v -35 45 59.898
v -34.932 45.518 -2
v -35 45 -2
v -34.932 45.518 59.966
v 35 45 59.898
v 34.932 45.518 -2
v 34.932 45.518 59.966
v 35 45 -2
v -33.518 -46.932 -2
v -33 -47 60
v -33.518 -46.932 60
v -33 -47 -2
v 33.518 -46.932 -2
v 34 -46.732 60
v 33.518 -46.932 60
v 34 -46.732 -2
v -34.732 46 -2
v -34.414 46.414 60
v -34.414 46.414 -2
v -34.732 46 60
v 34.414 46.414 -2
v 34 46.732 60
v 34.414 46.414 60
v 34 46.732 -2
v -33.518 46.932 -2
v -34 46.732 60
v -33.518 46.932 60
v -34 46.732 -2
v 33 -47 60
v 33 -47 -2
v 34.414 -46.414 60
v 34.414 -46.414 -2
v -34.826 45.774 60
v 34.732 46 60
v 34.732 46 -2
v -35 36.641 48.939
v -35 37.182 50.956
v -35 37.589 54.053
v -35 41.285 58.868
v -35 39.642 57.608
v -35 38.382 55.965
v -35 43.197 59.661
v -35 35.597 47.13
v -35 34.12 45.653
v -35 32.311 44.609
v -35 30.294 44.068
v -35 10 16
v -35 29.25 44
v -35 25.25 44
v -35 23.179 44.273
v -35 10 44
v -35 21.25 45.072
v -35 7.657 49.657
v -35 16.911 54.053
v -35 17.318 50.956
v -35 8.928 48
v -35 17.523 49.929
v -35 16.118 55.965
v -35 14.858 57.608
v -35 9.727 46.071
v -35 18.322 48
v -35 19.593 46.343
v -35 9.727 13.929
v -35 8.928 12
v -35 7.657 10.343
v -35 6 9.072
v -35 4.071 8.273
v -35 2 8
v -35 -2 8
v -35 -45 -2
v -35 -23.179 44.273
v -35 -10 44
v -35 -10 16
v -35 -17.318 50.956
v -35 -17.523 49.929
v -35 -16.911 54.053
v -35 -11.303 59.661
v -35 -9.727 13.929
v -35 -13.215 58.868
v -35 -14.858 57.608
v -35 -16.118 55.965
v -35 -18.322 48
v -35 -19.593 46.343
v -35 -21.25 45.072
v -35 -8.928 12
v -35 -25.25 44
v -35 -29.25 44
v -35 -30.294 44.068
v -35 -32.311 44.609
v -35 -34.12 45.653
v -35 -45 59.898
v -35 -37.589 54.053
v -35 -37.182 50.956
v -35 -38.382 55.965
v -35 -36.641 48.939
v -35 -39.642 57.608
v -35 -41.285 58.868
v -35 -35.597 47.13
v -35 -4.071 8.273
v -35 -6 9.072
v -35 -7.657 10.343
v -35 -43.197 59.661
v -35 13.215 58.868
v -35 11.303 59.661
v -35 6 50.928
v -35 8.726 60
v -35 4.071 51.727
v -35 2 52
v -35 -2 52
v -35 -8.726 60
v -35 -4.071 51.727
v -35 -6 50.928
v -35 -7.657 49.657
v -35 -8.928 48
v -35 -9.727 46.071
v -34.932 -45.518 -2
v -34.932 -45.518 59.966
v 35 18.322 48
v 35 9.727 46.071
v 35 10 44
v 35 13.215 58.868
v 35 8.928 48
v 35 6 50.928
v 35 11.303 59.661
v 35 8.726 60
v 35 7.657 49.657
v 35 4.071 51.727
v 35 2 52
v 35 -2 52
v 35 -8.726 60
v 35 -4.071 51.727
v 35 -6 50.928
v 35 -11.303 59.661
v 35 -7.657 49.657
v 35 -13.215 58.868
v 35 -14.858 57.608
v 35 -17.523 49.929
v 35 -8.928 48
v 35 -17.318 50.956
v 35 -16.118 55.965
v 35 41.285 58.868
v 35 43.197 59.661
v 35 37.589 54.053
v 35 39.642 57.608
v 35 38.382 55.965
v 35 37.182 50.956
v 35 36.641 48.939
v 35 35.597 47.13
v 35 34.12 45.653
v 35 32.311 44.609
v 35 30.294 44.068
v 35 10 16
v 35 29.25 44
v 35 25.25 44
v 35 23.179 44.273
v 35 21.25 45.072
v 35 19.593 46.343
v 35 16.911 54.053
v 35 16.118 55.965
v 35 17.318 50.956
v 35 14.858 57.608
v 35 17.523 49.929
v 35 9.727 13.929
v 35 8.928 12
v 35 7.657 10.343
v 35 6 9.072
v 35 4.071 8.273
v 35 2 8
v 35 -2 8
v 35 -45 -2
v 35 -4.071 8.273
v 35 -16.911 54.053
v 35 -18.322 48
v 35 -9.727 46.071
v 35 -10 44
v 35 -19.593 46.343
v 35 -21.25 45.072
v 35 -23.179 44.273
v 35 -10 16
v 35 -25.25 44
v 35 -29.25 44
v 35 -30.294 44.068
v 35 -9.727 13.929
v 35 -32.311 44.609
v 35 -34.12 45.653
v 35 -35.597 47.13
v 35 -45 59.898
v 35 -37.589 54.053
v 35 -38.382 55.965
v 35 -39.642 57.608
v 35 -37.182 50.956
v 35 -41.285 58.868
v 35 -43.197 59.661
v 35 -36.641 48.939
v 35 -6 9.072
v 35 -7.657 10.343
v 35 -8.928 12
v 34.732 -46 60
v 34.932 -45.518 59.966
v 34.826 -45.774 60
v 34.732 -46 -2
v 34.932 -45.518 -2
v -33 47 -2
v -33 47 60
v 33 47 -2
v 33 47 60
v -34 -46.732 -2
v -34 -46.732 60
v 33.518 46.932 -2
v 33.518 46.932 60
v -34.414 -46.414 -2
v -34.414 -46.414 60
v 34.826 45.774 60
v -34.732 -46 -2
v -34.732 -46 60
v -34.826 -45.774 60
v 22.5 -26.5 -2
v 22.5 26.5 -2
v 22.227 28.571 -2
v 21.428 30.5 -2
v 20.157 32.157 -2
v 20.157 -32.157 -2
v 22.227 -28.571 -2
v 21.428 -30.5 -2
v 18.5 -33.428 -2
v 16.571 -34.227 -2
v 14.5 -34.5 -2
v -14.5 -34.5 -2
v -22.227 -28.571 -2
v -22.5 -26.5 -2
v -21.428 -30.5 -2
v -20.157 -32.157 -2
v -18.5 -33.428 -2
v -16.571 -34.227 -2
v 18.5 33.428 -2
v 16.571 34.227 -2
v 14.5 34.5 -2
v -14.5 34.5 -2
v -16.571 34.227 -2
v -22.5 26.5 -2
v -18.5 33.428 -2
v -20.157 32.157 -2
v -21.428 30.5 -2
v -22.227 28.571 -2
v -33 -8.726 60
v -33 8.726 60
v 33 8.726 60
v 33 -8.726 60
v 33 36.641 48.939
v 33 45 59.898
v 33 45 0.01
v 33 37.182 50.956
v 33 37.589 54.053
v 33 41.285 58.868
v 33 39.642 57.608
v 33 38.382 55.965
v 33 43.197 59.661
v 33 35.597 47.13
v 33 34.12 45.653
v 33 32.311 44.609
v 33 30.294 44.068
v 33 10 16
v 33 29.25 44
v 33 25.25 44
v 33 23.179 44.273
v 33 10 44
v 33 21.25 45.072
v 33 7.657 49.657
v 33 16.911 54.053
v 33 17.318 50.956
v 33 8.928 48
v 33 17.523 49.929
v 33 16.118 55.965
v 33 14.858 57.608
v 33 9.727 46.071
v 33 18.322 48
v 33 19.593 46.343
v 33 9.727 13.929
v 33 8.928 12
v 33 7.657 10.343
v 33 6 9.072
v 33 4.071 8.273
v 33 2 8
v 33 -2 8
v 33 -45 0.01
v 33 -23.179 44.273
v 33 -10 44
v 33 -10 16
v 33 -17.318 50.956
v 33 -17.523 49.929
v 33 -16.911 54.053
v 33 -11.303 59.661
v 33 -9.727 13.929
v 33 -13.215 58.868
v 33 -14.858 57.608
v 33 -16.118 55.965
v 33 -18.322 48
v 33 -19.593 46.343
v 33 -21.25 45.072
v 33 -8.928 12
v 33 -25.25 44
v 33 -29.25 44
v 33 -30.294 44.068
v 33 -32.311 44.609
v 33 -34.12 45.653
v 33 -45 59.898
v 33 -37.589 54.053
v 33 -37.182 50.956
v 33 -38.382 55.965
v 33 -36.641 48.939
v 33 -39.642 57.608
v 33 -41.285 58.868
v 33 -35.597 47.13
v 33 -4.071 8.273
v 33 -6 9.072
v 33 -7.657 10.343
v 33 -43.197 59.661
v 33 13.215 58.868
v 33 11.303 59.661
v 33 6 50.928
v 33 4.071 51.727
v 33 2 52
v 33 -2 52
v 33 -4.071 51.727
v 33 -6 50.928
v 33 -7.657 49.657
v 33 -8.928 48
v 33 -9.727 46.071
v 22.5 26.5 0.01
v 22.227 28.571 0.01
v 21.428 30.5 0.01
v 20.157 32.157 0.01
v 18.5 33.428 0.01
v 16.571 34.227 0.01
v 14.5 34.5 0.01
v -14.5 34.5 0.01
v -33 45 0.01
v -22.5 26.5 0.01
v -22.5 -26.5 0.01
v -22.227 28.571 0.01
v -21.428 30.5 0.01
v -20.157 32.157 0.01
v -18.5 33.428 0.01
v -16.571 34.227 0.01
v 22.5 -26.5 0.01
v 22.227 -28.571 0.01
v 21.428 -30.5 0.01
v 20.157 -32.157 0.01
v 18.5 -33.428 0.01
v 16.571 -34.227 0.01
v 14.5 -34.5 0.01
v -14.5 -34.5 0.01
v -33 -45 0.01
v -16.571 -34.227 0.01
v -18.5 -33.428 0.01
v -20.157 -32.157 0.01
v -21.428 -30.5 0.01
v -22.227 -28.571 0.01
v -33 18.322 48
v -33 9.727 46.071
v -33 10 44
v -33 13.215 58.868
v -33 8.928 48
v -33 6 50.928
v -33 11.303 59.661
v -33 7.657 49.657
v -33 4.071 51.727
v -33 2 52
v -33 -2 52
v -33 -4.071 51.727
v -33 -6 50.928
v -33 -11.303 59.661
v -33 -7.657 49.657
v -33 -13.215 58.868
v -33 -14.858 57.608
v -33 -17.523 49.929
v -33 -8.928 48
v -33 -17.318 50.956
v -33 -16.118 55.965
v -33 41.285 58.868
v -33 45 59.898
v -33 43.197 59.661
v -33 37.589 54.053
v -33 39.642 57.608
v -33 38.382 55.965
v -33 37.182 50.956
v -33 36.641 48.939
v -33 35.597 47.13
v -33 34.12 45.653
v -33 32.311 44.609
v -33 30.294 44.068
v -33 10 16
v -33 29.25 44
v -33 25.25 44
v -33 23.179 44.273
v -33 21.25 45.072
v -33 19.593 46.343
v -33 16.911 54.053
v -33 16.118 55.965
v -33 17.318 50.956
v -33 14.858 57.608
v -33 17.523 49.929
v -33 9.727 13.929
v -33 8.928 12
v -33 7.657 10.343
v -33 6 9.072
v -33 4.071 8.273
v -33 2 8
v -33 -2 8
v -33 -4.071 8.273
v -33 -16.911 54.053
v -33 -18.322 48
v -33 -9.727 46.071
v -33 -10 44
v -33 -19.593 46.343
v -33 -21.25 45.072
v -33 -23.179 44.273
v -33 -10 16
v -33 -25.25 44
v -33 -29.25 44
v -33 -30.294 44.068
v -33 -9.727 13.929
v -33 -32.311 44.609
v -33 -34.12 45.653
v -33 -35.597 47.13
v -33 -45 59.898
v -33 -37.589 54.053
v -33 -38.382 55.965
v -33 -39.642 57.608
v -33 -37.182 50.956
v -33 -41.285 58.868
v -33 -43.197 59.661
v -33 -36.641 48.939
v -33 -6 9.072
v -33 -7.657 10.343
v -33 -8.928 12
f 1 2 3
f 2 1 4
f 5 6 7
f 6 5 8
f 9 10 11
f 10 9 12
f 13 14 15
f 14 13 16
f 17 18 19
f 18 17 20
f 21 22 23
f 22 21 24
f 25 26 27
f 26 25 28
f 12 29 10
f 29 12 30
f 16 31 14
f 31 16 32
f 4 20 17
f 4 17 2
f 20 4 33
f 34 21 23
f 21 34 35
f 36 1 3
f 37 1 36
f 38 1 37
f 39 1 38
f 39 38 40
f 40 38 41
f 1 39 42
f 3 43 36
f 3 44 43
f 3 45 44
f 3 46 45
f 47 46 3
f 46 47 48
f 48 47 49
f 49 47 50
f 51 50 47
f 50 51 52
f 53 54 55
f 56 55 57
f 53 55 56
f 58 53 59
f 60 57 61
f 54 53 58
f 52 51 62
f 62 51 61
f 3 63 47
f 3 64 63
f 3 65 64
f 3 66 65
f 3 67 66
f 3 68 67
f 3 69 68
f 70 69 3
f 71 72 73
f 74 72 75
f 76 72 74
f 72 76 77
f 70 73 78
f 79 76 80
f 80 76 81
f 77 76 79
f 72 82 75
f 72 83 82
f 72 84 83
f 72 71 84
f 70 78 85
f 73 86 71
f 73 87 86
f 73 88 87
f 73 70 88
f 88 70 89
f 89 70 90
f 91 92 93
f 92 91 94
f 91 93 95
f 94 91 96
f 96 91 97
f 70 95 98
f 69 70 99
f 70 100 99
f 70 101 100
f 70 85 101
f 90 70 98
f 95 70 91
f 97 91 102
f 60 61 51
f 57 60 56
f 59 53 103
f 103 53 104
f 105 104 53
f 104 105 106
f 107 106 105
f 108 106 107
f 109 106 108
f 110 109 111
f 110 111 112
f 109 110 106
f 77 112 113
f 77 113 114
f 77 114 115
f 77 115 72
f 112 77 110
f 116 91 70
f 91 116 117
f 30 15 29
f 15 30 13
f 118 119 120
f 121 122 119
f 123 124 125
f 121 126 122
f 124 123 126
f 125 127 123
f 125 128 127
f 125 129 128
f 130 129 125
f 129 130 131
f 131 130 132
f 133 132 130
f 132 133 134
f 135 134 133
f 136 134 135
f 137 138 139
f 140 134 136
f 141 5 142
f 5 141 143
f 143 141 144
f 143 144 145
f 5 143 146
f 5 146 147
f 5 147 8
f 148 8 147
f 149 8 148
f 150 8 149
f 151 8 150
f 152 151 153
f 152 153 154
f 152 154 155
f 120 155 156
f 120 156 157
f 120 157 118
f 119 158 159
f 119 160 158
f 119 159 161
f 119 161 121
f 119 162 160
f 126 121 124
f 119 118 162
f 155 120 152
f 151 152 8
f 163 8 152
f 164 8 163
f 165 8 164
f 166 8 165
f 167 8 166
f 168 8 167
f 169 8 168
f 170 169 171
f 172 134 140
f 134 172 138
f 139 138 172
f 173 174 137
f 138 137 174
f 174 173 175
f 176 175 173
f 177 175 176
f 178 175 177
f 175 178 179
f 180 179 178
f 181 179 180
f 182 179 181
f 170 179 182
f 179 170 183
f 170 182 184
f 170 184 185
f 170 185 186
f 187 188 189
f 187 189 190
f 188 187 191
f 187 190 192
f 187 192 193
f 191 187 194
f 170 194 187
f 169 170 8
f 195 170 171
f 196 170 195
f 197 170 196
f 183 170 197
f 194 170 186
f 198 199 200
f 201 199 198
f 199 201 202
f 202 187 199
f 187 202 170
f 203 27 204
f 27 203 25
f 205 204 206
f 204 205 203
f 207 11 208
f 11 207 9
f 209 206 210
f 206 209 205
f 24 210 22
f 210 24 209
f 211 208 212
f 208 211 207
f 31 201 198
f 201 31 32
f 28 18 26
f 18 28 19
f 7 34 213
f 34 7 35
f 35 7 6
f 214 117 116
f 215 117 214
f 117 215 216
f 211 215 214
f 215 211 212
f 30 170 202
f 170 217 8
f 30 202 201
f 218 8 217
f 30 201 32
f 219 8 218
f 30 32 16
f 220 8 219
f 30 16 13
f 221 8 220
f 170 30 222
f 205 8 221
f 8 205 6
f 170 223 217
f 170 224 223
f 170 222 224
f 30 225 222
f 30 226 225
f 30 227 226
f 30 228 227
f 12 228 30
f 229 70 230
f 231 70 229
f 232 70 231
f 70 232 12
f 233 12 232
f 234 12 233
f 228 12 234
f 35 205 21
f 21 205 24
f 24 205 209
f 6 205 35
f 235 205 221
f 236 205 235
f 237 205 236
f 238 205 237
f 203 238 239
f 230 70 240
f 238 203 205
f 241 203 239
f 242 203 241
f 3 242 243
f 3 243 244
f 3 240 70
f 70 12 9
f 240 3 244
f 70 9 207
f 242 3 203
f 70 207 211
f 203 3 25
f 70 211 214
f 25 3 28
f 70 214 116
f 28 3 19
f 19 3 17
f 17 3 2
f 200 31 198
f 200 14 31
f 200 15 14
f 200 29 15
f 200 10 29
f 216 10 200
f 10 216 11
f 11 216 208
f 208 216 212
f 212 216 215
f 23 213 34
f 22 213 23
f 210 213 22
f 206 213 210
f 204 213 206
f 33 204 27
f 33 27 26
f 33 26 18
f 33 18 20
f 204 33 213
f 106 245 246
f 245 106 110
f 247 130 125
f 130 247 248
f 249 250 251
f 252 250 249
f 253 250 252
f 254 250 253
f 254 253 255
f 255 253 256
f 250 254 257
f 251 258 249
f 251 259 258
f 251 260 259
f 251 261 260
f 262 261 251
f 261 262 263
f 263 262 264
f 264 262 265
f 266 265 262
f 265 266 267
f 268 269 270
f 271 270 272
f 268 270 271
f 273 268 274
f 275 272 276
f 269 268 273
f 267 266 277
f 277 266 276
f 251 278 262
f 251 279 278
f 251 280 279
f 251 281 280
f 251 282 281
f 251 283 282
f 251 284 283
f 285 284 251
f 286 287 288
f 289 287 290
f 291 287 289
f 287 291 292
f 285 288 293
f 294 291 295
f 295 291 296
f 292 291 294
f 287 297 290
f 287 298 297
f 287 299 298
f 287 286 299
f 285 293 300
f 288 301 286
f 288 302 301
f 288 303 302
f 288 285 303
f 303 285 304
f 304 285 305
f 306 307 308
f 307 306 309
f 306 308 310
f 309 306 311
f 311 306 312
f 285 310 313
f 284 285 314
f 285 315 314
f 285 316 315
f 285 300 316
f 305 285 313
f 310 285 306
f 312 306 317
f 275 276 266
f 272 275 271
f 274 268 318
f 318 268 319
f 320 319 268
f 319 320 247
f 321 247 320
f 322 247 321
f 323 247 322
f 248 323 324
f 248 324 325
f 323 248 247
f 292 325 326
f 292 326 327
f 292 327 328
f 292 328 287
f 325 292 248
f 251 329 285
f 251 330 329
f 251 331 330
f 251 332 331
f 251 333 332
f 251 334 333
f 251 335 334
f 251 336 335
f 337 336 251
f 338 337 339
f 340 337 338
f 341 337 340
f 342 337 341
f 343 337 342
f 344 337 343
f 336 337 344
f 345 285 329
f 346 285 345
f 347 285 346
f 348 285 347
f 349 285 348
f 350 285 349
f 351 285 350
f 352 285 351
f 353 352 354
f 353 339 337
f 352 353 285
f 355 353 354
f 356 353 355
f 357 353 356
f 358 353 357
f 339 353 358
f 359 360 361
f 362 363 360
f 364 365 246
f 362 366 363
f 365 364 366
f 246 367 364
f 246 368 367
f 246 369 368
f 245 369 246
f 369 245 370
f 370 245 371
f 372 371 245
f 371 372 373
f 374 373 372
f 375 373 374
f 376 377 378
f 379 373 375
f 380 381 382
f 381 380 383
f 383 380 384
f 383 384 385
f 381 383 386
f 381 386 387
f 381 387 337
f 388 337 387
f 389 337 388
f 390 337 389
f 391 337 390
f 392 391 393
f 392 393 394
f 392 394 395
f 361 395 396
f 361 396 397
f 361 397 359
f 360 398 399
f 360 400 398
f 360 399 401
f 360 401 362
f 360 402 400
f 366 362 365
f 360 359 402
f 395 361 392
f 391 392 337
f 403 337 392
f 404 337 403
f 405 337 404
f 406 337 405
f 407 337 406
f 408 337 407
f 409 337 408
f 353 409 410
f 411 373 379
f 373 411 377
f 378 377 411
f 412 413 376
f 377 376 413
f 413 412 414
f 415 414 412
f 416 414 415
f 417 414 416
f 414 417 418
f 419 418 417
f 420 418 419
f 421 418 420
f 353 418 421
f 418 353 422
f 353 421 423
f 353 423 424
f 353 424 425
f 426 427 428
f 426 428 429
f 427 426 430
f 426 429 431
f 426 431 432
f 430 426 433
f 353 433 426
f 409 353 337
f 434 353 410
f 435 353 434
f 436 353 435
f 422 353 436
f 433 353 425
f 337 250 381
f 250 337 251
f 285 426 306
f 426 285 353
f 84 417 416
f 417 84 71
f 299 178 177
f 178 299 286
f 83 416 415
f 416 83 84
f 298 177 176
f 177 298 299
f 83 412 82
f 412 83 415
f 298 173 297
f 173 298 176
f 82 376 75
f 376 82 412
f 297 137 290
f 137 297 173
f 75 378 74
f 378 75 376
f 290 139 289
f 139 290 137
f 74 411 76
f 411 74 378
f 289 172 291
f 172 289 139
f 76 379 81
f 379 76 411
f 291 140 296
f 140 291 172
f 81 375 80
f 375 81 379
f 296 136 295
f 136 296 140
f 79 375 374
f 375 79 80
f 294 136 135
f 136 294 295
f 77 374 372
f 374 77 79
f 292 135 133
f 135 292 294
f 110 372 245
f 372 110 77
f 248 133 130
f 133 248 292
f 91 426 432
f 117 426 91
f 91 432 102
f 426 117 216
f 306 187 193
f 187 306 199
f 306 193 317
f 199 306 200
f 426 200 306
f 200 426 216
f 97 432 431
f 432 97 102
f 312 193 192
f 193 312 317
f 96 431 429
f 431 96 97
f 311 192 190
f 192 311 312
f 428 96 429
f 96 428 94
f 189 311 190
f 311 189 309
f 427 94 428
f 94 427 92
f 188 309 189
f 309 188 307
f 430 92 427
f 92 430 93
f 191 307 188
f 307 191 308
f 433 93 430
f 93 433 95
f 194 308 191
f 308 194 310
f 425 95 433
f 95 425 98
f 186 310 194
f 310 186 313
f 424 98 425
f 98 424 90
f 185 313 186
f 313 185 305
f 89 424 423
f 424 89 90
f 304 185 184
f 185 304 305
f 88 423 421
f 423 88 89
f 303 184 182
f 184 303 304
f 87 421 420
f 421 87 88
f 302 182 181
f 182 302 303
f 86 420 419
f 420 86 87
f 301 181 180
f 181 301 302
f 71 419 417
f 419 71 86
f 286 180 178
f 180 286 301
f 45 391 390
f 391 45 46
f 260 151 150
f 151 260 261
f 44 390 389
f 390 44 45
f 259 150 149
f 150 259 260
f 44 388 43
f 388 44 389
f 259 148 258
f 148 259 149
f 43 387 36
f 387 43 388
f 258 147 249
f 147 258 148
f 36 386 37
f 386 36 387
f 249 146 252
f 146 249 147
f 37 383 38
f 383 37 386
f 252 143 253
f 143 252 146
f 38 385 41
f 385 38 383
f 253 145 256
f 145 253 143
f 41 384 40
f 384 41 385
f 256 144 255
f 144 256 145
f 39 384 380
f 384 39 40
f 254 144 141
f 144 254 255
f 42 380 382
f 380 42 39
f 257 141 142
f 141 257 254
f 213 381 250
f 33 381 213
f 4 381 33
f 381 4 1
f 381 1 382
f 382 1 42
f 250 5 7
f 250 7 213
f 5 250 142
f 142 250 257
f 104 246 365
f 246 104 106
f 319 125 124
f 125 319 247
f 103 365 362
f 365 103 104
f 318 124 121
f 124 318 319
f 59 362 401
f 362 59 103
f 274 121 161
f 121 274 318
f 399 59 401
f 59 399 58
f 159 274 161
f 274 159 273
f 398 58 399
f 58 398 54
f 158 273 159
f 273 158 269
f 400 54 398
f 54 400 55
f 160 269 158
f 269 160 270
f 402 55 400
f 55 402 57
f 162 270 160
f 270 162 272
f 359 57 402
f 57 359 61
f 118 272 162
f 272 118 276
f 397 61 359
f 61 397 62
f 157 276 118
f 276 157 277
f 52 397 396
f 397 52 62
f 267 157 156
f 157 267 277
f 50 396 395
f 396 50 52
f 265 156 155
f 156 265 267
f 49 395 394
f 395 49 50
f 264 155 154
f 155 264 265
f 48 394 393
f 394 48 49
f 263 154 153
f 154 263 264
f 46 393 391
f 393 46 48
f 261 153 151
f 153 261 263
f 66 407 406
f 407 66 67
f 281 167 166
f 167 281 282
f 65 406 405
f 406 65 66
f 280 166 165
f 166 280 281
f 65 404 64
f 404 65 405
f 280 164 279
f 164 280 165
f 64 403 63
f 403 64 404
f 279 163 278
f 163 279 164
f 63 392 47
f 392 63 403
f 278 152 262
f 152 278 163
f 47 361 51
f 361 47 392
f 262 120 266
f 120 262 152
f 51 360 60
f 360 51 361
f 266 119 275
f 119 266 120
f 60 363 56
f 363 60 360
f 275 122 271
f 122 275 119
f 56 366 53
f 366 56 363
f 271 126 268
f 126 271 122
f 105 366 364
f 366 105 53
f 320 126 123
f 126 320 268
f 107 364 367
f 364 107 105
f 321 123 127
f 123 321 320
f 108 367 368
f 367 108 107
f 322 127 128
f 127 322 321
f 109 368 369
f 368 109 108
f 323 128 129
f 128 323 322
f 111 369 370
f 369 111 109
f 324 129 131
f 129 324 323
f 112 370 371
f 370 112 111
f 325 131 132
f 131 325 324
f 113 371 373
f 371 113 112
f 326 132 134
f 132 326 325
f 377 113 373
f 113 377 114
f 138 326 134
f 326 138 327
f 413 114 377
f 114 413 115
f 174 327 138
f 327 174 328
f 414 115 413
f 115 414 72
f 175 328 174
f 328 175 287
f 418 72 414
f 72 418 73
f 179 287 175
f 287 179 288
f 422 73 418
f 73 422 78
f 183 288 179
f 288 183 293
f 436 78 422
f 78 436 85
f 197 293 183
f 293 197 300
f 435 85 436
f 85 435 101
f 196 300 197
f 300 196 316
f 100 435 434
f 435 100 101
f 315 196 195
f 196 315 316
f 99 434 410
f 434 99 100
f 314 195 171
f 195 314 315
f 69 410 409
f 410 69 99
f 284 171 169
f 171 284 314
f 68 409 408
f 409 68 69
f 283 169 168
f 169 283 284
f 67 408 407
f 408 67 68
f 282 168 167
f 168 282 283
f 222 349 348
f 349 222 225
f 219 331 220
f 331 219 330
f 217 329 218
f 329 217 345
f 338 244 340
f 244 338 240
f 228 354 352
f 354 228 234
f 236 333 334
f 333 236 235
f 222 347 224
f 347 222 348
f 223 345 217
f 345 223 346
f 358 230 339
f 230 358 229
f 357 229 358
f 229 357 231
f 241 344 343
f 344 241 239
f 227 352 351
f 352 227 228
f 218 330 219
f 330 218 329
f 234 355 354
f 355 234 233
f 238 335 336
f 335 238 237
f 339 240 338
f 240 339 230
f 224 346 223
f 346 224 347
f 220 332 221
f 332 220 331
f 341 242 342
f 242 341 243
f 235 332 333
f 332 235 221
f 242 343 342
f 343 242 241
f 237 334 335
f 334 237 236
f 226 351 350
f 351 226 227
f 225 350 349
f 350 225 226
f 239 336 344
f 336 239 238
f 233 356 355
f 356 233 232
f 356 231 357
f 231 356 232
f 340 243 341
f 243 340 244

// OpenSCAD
// file: ../../lib/debug.scad
module debug_point(p, c = "black") {
    %color(c)
        translate(p)
        circle(0.5);
}

module debug_points(pts, trans = function (x) x, rot = [0, 0, 0], c = "red") {
    $fn = 4;
    r = 1.5;

    color(c)
    for (i = [0 : 1 : len(pts) - 1]) {
        p = pts[i];

        if (len(p) == 2) {
            translate(trans(p)) {
                sphere(r);

                rotate(rot)
                translate([r, r])
                text(str(i));
            }
        }
    }
}
// main file
use <../../lib/debug.scad>

DEBUG = false;

card = [65, 89];

holder_height = 60;
holder_wall = 2;
holder_gap = 1;

holder_cutout_width = 20;
holder_cutout_rounding = 8;


module card_stack() {
    %color("#FFFFFF66")
    translate([0, 0, holder_height / 2])
    cube([card.x, card.y, holder_height], center = true);
}


module card_holder() {
    module card_stack_expanded() {
        h = holder_height * 2;
        expand = [holder_gap, holder_gap, 0];

        translate([0, 0, h / 2 + 0.01])
        cube([card.x, card.y, h] + expand, center = true);
    }

    module base() {
        module rounder() {
            $fn = 24;
            cylinder(h = holder_wall, r = holder_wall, center = true);
        }

        translate([0, 0, holder_height / 2 - holder_wall / 2])
        minkowski() {
            cube([card.x + holder_gap, card.y + holder_gap, holder_height], center = true);
            rounder();
        }
    }

    module rounden_cutout() {
        $fn = 24;
        offset(holder_cutout_rounding)
        offset(- holder_cutout_rounding * 2)
        offset(holder_cutout_rounding)
        children();
    }

    module cutout_on_yz() {
        points1 = [
            [- holder_cutout_width / 2, holder_height - holder_cutout_rounding],
            [- holder_cutout_width / 2, holder_cutout_rounding],
            [holder_cutout_width / 2, holder_cutout_rounding],
            [holder_cutout_width / 2, holder_height - holder_cutout_rounding],
        ];

        p2_mid = card.y / 2 + holder_cutout_width / 2;

        points2 = [
            [- p2_mid / 2 - holder_cutout_width - holder_cutout_rounding * 2, holder_height + holder_cutout_rounding * 2],
            [- p2_mid / 2 - holder_cutout_width - holder_cutout_rounding * 2, holder_height],
            [- p2_mid / 2 - holder_cutout_width / 2, holder_height],
            [- p2_mid / 2 - holder_cutout_width / 2, holder_height - holder_cutout_rounding * 2],
            [- p2_mid / 2 + holder_cutout_width / 2, holder_height - holder_cutout_rounding * 2],
            [- p2_mid / 2 + holder_cutout_width / 2, holder_height],
            [- p2_mid / 2 + holder_cutout_width + holder_cutout_rounding * 2, holder_height],
            [- p2_mid / 2 + holder_cutout_width + holder_cutout_rounding * 2, holder_height + holder_cutout_rounding * 2],
        ];

        module profile() {
            rounden_cutout()
            polygon(points1);

            rounden_cutout()
            polygon(points2);

            mirror([1, 0])
            rounden_cutout()
            polygon(points2);

        }

        rotate([90, 0, 90])
        if (DEBUG) {
            %translate([0, 0, card.x / 2 + holder_wall + holder_gap]) {
                debug_points(points1);
                debug_points(points2, c = "green");
            }
        } else {
            linear_extrude(card.x + holder_wall * 2 + holder_gap + 1, center = true)
            profile();
        }
    }


    module cutout_on_xy() {
        linear_extrude(holder_height, center = true)
        rounden_cutout()
        square(card - [20, 20], center = true);
    }


    difference() {
        base();

        card_stack_expanded();

        cutout_on_yz();
        cutout_on_xy();
    }
}


card_stack();
card_holder();
